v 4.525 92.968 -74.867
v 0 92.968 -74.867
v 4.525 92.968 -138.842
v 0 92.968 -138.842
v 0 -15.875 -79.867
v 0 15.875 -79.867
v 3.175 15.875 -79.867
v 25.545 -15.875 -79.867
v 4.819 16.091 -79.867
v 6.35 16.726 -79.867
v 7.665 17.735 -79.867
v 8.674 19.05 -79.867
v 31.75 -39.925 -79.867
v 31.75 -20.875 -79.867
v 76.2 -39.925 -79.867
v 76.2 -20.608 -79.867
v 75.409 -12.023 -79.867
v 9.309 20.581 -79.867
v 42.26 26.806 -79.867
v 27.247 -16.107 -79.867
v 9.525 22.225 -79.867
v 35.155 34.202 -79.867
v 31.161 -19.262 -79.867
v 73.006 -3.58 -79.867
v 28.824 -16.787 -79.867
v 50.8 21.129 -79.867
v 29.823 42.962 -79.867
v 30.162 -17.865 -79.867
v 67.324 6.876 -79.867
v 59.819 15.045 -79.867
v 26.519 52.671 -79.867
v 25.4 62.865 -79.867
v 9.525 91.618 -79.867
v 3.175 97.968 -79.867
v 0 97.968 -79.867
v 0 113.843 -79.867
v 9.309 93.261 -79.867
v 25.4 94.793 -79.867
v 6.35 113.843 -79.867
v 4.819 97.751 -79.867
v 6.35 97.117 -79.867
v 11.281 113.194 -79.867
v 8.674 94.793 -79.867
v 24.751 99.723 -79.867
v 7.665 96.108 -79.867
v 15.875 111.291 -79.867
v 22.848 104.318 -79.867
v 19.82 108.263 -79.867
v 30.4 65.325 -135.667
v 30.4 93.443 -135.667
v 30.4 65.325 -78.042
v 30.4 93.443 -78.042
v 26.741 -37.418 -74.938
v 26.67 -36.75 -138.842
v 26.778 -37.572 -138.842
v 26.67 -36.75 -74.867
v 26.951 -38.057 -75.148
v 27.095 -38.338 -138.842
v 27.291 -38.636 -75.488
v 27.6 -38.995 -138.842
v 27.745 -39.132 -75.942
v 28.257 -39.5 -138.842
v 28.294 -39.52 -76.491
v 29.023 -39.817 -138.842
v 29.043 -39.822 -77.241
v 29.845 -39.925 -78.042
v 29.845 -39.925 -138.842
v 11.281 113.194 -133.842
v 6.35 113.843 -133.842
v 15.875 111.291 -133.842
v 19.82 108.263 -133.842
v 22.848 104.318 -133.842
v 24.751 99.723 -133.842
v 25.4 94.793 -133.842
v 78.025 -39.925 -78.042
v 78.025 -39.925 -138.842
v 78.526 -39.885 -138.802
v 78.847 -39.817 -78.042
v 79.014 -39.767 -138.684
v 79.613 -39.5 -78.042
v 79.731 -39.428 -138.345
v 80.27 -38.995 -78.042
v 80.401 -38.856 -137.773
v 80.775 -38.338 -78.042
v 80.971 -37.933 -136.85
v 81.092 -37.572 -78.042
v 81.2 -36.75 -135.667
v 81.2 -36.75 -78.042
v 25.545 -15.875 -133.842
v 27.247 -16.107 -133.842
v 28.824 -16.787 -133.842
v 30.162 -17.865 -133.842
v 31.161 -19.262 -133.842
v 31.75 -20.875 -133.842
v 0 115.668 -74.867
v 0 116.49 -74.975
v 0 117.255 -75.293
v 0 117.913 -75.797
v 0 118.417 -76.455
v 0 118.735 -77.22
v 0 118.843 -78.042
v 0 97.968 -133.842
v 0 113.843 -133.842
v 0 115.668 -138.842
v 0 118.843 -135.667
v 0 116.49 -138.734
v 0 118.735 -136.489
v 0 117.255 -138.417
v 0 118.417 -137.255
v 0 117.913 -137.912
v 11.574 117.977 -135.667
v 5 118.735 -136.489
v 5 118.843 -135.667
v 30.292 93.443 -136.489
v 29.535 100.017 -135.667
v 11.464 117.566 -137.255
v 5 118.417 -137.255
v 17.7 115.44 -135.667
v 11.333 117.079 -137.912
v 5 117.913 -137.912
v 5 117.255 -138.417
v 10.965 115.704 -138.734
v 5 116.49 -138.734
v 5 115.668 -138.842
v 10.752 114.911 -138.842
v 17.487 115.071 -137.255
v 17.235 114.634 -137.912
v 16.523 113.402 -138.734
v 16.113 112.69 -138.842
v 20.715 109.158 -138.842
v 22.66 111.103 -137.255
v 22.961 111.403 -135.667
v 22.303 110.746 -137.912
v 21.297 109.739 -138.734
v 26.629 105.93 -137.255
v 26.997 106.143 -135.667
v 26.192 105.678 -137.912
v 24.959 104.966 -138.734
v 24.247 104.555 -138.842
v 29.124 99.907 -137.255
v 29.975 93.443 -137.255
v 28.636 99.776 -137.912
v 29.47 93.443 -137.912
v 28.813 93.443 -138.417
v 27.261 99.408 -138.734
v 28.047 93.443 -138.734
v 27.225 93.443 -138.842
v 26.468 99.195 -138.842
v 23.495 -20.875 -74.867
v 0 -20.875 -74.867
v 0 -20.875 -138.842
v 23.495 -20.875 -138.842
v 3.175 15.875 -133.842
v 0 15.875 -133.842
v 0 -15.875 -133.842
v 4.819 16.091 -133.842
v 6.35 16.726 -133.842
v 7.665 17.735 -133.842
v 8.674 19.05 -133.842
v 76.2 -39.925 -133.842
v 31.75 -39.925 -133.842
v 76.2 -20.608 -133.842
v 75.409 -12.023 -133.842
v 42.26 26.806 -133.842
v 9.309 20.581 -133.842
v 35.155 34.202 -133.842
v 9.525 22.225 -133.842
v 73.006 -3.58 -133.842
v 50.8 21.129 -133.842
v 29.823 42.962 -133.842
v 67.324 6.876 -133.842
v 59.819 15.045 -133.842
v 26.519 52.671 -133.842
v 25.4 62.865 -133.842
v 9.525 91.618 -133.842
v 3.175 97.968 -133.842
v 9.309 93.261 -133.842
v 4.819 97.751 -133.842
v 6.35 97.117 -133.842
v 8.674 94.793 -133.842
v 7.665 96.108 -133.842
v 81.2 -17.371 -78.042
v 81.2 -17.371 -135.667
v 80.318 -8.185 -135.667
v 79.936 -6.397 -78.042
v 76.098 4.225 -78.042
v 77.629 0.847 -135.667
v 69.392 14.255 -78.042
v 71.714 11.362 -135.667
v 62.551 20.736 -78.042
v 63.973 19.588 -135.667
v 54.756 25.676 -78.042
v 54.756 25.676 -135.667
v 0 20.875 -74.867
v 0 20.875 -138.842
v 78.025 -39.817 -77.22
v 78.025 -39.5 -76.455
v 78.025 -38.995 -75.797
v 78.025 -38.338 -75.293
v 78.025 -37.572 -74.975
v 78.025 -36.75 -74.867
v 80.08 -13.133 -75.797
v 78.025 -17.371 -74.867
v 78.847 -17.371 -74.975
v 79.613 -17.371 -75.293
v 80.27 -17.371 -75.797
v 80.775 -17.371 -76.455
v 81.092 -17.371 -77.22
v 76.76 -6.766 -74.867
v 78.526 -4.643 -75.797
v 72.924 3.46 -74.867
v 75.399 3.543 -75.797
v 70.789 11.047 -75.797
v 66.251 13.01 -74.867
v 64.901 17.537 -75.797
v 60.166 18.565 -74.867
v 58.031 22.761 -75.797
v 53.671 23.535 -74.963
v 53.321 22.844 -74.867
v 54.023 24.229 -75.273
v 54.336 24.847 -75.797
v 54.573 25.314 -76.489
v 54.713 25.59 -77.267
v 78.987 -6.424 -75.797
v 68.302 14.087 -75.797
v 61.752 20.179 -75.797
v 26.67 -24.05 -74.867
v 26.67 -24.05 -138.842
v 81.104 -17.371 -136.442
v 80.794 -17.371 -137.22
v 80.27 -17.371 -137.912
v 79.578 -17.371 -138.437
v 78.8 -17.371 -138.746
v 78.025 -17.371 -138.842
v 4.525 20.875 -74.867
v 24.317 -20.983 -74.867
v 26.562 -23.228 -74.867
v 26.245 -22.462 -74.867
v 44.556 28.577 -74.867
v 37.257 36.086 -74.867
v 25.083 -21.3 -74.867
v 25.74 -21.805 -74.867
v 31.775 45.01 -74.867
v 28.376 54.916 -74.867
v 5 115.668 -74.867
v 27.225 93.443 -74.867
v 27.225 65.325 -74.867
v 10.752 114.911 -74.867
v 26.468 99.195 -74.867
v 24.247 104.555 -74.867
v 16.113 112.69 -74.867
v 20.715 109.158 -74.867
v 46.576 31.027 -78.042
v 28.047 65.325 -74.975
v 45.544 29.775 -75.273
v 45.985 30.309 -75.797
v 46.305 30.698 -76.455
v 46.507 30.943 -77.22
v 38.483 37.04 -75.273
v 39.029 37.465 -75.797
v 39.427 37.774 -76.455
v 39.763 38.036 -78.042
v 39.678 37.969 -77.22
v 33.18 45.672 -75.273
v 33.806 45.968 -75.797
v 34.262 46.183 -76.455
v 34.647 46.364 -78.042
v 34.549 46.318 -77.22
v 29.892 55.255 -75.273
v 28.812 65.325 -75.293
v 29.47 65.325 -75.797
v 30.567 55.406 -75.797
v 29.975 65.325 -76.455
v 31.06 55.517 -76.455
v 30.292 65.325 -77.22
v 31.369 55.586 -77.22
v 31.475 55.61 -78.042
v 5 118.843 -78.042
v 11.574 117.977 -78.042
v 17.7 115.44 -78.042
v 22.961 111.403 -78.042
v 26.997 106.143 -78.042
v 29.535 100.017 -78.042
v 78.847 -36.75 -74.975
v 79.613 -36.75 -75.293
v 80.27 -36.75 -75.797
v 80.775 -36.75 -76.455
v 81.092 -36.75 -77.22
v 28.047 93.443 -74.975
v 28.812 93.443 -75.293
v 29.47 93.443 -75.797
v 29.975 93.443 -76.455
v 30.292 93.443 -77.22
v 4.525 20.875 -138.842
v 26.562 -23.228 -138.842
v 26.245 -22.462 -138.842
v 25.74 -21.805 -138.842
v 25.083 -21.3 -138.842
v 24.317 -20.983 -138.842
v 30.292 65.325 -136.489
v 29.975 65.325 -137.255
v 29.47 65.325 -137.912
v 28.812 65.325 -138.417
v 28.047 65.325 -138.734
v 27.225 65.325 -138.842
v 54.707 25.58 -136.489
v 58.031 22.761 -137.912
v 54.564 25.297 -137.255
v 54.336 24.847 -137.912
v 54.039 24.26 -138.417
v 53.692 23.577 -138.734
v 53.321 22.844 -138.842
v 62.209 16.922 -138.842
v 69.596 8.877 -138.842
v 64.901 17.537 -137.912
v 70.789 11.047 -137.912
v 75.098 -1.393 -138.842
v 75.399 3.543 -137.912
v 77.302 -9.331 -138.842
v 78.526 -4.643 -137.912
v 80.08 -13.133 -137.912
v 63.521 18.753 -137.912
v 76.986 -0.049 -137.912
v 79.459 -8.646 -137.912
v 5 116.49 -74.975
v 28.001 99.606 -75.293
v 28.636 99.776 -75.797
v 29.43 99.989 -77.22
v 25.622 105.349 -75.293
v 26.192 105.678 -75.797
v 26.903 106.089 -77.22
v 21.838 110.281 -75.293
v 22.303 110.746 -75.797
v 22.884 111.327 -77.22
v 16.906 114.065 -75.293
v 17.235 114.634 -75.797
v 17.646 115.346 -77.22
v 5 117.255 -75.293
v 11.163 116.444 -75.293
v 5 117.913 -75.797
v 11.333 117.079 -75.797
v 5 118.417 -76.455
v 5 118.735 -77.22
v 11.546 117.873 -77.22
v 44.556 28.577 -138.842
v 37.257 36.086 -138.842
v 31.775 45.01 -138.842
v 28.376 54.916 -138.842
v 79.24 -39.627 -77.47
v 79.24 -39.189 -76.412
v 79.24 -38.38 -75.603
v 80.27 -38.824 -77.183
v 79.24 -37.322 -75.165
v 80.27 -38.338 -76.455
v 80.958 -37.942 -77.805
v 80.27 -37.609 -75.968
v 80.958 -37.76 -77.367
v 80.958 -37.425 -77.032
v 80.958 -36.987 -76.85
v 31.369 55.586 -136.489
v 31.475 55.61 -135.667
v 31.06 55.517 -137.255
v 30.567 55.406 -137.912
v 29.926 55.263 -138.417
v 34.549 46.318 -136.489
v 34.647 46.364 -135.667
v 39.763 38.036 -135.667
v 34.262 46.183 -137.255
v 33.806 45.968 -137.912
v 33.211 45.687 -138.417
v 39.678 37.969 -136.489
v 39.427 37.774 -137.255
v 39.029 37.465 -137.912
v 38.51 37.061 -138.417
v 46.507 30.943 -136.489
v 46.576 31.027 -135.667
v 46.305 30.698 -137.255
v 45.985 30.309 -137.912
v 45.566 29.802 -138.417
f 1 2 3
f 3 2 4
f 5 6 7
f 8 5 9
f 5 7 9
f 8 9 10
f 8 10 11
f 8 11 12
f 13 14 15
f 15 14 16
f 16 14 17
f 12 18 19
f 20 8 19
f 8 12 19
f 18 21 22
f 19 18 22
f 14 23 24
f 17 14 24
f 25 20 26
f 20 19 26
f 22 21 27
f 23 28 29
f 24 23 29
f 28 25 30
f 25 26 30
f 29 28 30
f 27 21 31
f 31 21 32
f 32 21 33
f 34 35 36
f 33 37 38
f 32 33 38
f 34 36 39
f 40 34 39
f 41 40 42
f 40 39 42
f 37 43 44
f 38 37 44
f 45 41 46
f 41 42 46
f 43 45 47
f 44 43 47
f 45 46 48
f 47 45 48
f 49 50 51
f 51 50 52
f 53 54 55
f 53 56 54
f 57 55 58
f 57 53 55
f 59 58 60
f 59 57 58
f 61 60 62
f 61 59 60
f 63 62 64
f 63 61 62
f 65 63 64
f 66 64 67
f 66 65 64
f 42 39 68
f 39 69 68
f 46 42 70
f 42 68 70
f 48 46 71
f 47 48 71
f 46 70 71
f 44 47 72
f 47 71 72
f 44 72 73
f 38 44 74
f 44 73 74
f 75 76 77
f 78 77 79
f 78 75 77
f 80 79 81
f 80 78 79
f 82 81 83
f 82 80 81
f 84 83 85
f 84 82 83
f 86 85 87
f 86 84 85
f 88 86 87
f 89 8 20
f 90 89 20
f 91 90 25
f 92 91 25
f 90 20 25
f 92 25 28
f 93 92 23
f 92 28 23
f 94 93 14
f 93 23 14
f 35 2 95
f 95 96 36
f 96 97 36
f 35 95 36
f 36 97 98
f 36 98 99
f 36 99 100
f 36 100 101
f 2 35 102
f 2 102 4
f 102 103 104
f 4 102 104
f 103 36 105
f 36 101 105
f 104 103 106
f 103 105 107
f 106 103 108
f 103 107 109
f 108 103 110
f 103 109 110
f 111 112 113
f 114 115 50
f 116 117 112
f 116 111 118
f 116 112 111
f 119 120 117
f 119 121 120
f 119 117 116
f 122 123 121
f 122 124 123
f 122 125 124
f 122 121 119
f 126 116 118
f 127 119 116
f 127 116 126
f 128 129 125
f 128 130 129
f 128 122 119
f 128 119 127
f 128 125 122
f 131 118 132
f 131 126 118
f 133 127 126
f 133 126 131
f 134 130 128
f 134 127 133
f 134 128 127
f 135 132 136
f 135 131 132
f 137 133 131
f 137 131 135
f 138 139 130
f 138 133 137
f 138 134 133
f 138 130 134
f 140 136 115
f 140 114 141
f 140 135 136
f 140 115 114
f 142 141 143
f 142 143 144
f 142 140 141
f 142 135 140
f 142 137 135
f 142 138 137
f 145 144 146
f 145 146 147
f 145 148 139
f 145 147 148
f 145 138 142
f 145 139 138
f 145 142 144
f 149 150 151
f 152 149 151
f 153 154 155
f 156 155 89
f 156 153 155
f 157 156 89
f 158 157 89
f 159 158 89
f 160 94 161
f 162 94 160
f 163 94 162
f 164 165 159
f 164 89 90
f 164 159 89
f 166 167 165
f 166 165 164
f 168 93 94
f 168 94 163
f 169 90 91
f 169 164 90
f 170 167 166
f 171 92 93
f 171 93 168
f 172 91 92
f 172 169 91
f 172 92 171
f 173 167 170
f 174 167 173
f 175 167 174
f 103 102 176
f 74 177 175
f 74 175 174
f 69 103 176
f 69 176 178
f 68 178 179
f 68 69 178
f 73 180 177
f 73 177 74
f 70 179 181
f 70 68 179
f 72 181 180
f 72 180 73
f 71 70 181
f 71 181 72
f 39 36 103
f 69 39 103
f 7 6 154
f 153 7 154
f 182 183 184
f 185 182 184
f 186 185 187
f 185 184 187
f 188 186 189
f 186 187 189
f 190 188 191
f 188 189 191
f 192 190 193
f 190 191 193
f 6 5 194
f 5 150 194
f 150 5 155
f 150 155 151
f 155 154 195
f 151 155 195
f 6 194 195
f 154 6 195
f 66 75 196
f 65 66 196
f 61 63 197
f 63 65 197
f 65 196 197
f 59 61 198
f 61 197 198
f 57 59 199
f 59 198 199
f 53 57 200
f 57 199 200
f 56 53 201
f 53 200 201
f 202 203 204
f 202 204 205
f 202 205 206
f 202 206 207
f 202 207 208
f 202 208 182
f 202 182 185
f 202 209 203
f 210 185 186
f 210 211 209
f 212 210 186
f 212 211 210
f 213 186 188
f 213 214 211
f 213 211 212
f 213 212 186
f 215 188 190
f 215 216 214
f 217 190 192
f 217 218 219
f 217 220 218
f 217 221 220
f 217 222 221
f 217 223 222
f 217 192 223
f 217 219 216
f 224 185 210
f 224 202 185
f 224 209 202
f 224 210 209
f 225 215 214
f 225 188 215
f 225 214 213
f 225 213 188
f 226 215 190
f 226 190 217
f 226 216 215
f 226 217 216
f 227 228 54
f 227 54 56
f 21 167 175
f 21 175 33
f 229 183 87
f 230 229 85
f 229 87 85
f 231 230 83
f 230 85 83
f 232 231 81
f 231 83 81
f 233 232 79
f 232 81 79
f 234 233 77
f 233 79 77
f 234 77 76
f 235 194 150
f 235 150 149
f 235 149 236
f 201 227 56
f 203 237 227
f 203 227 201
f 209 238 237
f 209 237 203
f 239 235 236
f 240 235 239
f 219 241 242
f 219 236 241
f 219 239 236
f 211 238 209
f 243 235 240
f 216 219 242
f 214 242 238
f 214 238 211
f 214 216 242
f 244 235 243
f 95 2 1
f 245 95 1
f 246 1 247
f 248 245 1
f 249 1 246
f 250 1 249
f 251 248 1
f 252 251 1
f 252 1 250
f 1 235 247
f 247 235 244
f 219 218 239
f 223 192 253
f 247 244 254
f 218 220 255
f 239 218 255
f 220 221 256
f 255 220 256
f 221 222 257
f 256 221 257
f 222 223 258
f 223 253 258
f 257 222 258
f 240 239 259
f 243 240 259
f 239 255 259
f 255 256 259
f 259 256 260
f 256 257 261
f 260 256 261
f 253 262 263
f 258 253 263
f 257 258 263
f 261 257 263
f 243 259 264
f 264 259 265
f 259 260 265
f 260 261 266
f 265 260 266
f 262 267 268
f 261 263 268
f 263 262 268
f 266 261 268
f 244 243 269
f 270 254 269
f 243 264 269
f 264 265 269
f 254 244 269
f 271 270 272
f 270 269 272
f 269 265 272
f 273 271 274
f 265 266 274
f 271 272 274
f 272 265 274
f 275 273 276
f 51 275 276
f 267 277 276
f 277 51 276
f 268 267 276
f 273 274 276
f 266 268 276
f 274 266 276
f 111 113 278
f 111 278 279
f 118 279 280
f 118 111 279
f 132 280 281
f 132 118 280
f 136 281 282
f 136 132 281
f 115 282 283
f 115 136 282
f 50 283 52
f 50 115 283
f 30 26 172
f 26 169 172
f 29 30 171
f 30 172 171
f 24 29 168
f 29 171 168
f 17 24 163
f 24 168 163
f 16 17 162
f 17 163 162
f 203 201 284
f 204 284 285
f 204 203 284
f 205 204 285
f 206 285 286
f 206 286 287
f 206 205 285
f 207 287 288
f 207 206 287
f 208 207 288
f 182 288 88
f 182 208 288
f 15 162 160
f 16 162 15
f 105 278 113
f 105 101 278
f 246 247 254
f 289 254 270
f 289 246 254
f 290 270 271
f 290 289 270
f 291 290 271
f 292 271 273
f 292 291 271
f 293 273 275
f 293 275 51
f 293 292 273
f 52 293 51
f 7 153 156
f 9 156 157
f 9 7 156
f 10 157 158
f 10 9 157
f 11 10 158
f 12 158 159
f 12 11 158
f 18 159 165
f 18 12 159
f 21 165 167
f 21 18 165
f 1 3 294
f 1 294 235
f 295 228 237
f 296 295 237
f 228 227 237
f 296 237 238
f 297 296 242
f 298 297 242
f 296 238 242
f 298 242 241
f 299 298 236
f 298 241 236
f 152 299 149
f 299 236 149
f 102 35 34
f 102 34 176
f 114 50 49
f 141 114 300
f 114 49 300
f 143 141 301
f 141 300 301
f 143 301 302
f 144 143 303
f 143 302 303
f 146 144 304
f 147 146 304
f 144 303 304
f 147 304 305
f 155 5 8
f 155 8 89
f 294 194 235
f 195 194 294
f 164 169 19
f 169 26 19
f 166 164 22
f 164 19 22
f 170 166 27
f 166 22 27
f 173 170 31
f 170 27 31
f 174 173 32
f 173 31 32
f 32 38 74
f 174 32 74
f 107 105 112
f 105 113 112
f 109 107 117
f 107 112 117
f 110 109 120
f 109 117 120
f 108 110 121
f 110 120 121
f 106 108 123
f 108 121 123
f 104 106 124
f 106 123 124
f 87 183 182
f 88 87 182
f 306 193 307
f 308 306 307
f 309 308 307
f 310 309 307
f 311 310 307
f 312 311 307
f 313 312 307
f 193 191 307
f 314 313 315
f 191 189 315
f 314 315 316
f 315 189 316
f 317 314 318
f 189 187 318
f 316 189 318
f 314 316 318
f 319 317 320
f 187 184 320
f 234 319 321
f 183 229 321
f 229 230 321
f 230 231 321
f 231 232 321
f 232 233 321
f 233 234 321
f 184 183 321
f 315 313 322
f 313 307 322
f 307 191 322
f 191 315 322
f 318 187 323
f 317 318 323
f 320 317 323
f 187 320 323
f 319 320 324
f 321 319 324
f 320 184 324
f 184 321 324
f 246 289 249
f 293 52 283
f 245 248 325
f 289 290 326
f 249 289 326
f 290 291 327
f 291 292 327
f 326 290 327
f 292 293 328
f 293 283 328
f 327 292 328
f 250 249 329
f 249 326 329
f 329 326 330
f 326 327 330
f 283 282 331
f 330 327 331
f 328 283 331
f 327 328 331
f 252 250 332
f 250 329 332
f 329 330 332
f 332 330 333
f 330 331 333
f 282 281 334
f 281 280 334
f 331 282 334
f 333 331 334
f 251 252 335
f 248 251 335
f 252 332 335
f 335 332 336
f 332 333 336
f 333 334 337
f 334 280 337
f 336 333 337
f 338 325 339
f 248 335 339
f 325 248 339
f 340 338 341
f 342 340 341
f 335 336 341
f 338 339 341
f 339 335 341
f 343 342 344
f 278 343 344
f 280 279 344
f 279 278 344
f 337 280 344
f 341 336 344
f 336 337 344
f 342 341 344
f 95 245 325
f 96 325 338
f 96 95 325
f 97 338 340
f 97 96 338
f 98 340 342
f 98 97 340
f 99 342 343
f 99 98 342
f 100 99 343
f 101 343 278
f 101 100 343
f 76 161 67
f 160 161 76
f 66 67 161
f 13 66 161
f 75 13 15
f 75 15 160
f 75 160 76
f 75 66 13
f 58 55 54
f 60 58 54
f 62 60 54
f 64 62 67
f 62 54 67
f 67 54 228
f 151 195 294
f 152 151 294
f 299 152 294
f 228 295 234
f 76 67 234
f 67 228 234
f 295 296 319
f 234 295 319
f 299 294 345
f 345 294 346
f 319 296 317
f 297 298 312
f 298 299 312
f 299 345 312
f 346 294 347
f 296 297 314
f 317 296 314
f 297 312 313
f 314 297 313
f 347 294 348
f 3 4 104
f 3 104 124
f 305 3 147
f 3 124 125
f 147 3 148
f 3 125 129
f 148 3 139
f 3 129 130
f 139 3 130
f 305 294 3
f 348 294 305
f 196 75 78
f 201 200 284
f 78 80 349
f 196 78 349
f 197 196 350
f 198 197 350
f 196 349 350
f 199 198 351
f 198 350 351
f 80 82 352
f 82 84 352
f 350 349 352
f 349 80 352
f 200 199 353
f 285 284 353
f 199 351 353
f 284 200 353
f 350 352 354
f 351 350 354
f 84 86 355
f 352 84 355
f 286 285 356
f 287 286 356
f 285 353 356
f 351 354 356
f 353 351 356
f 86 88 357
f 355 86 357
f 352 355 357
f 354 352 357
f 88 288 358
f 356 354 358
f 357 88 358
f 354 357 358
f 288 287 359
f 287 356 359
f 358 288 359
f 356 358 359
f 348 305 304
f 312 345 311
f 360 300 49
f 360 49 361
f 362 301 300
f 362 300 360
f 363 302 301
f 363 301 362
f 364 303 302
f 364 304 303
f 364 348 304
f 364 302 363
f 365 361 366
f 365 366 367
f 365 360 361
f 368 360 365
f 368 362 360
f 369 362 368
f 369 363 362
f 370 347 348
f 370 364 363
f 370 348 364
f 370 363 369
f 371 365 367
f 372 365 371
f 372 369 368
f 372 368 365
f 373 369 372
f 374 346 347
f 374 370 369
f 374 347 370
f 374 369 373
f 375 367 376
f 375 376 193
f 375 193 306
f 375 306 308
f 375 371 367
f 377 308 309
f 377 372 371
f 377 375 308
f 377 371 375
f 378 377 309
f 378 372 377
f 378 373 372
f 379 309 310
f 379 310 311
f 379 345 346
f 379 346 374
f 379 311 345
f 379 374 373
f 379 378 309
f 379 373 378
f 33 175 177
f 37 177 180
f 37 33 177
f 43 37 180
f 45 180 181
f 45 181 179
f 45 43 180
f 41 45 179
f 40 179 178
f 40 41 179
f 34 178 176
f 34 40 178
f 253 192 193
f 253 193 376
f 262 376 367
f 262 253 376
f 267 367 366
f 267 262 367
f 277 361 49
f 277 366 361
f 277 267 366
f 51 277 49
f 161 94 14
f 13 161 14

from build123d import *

# Parameters (mm, degrees)
SKETCH1_W           = 53.975
SKETCH1_H           = 31.75
BOSS_EXTRUDE1_DEPTH = 76.2
SHELL1_T            = 5
SKETCH2_W           = 44.45
SKETCH2_H           = 53.975
CUT_EXTRUDE1_DEPTH  = 5
FILLET2_R           = 6.35
SKETCH3_W           = 54.53
SKETCH3_H           = 63.975
SKETCH3_W_2         = 44.45
SKETCH3_H_2         = 53.975
BOSS_EXTRUDE2_DEPTH = 19.05
FILLET5_R           = 3.175
FILLET6_R           = 3.175
SKETCH4_W           = 53.975
SKETCH4_H           = 15.875
BOSS_EXTRUDE3_DEPTH = 25.4
SHELL2_T            = 5
SKETCH5_W           = 15.875
SKETCH5_H           = 53.975
CUT_EXTRUDE2_DEPTH  = 5
SKETCH6_W           = 25.875
SKETCH6_H           = 63.975
SKETCH6_W_2         = 15.875
SKETCH6_H_2         = 53.975
BOSS_EXTRUDE4_DEPTH = 72.0928
SKETCH7_W           = 15.875
SKETCH7_H           = 53.975
CUT_EXTRUDE3_DEPTH  = 5
FILLET7_R           = 44.45
FILLET8_R           = 46.99
FILLET9_R           = 46.99
FILLET10_R          = 48.26
FILLET11_R          = 6.35
FILLET12_R          = 6.35
FILLET13_R          = 19.05
FILLET14_R          = 25.4
FILLET15_R          = 3.175


with BuildPart() as part:
    # Sketch1 → Boss-Extrude1 (new body)
    with BuildSketch(Plane(origin=(0, 0, 0), x_dir=(0, 0, -1), z_dir=(1, 0, 0))):
        with Locations((106.854663617, 0)):
            Rectangle(SKETCH1_W, SKETCH1_H)
    extrude(amount=BOSS_EXTRUDE1_DEPTH)

    # Shell1
    shell1_openings = [part.faces().sort_by_distance(p)[0] for p in [
        (0, 0, -106.854663617),
    ]]
    offset(amount=SHELL1_T, openings=shell1_openings, kind=Kind.INTERSECTION)

    # Sketch2 → Cut-Extrude1 (cut)
    with BuildSketch(Plane(origin=(0, -20.875, 0), x_dir=(-1, 0, 0), z_dir=(0, -1, 0))):
        with Locations((-53.975, 106.854663617)):
            Rectangle(SKETCH2_W, SKETCH2_H)
    extrude(amount=-CUT_EXTRUDE1_DEPTH, mode=Mode.SUBTRACT)

    # Fillet2
    # the kernel refuses this fillet: 6.35 mm, written as the material it takes off along each edge
    with BuildSketch(Plane(origin=(31.75, -15.875, -79.867163617), x_dir=(-1, 0, 0), z_dir=(0, 0, -1))) as fillet2_piece_1:
        with BuildLine():
            CenterArc((6.204836823, -6.35), FILLET2_R, 90, 77.725329785)
            Line((0, -5), (0, 0))
            Line((0, 0), (6.204836823, 0))
        make_face()
    extrude(amount=53.975, mode=Mode.SUBTRACT)

    # Sketch3 → Boss-Extrude2 (add)
    with BuildSketch(Plane.XZ.offset(20.875)):
        with Locations((53.935, -106.854663617)):
            Rectangle(SKETCH3_W, SKETCH3_H)
        with Locations((53.975, -106.854663617)):
            Rectangle(SKETCH3_W_2, SKETCH3_H_2, mode=Mode.SUBTRACT)
    extrude(amount=BOSS_EXTRUDE2_DEPTH)

    # Fillet5
    fillet5_edges = [part.edges().sort_by_distance(p)[0] for p in [
        (26.67, -20.875, -106.854663617),
    ]]
    fillet(fillet5_edges, radius=FILLET5_R)

    # Fillet6
    fillet6_edges = [part.edges().sort_by_distance(p)[0] for p in [
        (26.67, -39.925, -106.854663617),
        (53.935, -39.925, -74.867163617),
    ]]
    fillet(fillet6_edges, radius=FILLET6_R)



with BuildPart() as body_2:
    # Sketch4 → Boss-Extrude3 (new body)
    with BuildSketch(Plane(origin=(0, 0, 0), x_dir=(0, 0, -1), z_dir=(1, 0, 0))):
        with Locations((106.854663617, 105.9053)):
            Rectangle(SKETCH4_W, SKETCH4_H)
    extrude(amount=BOSS_EXTRUDE3_DEPTH)

    # Shell2
    shell2_openings = [body_2.faces().sort_by_distance(p)[0] for p in [
        (0, 105.9053, -106.854663617),
    ]]
    offset(amount=SHELL2_T, openings=shell2_openings, kind=Kind.INTERSECTION)

    # Sketch5 → Cut-Extrude2 (cut)
    with BuildSketch(Plane.XZ.offset(-92.9678)):
        with Locations((17.4625, -106.854663617)):
            Rectangle(SKETCH5_W, SKETCH5_H)
    extrude(amount=-CUT_EXTRUDE2_DEPTH, mode=Mode.SUBTRACT)


with BuildPart() as part_1:
    add(part.part)

    add(body_2.part)  # Boss-Extrude4 merges body 2
    # Sketch6 → Boss-Extrude4 (add)
    with BuildSketch(Plane.XZ.offset(-92.9678)):
        with Locations((17.4625, -106.854663617)):
            Rectangle(SKETCH6_W, SKETCH6_H)
        with Locations((17.4625, -106.854663617)):
            Rectangle(SKETCH6_W_2, SKETCH6_H_2, mode=Mode.SUBTRACT)
    extrude(amount=BOSS_EXTRUDE4_DEPTH)

    # Sketch7 → Cut-Extrude3 (cut)
    with BuildSketch(Plane.XZ.offset(-15.875)):
        with Locations((17.4625, -106.854663617)):
            Rectangle(SKETCH7_W, SKETCH7_H)
    extrude(amount=-CUT_EXTRUDE3_DEPTH, mode=Mode.SUBTRACT)

    # Fillet7
    fillet7_edges = [part_1.edges().sort_by_distance(p)[0] for p in [
        (30.4, 20.875, -106.854663617),
    ]]
    fillet(fillet7_edges, radius=FILLET7_R)

    # Fillet8
    fillet8_edges = [part_1.edges().sort_by_distance(p)[0] for p in [
        (25.4, 15.875, -106.854663617),
    ]]
    fillet(fillet8_edges, radius=FILLET8_R)

    # Fillet9
    fillet9_edges = [part_1.edges().sort_by_distance(p)[0] for p in [
        (76.2, 15.875, -106.854663617),
    ]]
    fillet(fillet9_edges, radius=FILLET9_R)

    # Fillet10
    fillet10_edges = [part_1.edges().sort_by_distance(p)[0] for p in [
        (81.2, 20.875, -106.854663617),
    ]]
    fillet(fillet10_edges, radius=FILLET10_R)

    # Fillet11
    fillet11_edges = [part_1.edges().sort_by_distance(p)[0] for p in [
        (9.525, 15.875, -106.854663617),
    ]]
    fillet(fillet11_edges, radius=FILLET11_R)

    # Fillet12
    fillet12_edges = [part_1.edges().sort_by_distance(p)[0] for p in [
        (9.525, 97.9678, -106.854663617),
    ]]
    fillet(fillet12_edges, radius=FILLET12_R)

    # Fillet13
    fillet13_edges = [part_1.edges().sort_by_distance(p)[0] for p in [
        (25.4, 113.8428, -106.854663617),
    ]]
    fillet(fillet13_edges, radius=FILLET13_R)

    # Fillet14
    fillet14_edges = [part_1.edges().sort_by_distance(p)[0] for p in [
        (30.4, 118.8428, -106.854663617),
    ]]
    fillet(fillet14_edges, radius=FILLET14_R)

    # Fillet15
    fillet15_edges = [part_1.edges().sort_by_distance(p)[0] for p in [
        (81.2, -28.648204314, -138.842163617),
        (30.4, 79.3839, -74.867163617),
        (30.4, 79.3839, -138.842163617),
        (36.975381235, 42.058806641, -138.842163617),
        (36.975381235, 42.058806641, -74.867163617),
        (74.061014659, 7.889029876, -138.842163617),
        (74.061014659, 7.889029876, -74.867163617),
        (2.5, 118.8428, -74.867163617),
        (2.5, 118.8428, -138.842163617),
        (22.960512242, 111.403312242, -138.842163617),
        (22.960512242, 111.403312242, -74.867163617),
        (81.2, -39.925, -108.442163617),
        (81.2, -27.060704314, -74.867163617),
        (81.2, -38.99506403, -75.797099587),
    ]]
    fillet(fillet15_edges, radius=FILLET15_R)


solid = part_1.part
